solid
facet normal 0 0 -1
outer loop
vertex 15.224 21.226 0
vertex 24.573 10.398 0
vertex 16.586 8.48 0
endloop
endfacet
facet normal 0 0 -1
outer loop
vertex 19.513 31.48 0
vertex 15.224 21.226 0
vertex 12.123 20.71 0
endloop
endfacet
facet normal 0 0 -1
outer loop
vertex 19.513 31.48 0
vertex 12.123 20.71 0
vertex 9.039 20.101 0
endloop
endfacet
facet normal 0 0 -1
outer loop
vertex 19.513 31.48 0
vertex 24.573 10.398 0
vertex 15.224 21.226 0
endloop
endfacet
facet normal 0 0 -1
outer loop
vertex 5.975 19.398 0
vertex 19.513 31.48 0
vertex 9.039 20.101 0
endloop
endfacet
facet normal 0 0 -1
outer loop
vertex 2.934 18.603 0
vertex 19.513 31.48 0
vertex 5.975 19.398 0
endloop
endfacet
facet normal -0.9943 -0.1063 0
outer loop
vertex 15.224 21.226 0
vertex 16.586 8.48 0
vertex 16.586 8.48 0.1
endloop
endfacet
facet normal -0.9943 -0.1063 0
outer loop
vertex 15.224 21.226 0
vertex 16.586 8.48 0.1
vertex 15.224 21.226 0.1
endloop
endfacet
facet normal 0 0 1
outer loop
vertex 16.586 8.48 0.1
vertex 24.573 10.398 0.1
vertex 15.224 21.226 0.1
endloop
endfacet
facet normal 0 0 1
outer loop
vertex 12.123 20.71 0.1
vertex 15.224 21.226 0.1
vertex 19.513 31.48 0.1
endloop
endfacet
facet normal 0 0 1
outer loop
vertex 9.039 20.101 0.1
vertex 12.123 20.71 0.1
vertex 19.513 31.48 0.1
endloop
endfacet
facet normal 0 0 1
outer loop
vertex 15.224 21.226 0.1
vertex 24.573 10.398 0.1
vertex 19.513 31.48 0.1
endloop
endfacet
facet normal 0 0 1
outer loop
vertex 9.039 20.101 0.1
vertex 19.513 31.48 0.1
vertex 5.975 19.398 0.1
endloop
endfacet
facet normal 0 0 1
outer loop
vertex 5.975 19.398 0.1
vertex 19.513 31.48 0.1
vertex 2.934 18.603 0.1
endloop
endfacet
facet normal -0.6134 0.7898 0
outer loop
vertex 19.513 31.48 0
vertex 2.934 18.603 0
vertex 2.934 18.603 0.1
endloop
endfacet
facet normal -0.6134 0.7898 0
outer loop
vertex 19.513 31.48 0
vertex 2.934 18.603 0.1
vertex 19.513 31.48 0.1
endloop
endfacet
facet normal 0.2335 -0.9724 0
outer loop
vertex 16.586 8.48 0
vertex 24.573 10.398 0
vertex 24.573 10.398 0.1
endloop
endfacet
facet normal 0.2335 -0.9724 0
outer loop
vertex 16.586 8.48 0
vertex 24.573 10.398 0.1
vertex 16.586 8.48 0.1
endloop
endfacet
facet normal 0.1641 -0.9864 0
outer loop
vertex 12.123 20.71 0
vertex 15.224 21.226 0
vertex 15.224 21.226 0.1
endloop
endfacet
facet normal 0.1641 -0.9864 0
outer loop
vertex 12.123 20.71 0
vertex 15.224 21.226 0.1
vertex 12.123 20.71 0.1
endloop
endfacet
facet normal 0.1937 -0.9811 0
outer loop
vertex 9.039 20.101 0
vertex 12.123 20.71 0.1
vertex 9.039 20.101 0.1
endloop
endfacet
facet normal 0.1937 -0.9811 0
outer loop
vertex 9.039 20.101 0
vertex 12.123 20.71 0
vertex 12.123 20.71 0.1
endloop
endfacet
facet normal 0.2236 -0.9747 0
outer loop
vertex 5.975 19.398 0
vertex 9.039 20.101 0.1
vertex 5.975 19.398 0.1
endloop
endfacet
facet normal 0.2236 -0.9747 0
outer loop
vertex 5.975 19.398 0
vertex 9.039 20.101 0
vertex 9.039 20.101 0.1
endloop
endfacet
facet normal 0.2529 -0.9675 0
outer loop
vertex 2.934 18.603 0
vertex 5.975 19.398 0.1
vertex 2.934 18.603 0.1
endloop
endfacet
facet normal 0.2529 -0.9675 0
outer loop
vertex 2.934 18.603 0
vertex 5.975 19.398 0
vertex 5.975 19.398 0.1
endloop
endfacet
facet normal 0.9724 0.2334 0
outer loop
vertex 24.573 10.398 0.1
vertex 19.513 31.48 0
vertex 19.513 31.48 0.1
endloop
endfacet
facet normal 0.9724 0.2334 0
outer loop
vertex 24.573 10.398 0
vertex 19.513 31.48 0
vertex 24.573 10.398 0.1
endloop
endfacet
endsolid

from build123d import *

# Parameters (mm, degrees)
SALIENTE_EXTRUIR1_DEPTH = 0.1


with BuildPart() as part:
    # Model → Saliente-Extruir1 (new body)
    with BuildSketch(Plane.XY):
        with BuildLine():
            Line((24.573492595, 10.397787824), (16.586059329, 8.480394017))
            Line((16.586059329, 8.480394017), (15.223673977, 21.22645362))
            ThreePointArc((15.223673977, 21.22645362), (9.038896644, 20.100865764), (2.933605753, 18.6029199))
            Line((2.933605753, 18.6029199), (19.512585392, 31.480394017))
            Line((19.512585392, 31.480394017), (24.573492595, 10.397787824))
        make_face()
    extrude(amount=SALIENTE_EXTRUIR1_DEPTH)


solid = part.part
